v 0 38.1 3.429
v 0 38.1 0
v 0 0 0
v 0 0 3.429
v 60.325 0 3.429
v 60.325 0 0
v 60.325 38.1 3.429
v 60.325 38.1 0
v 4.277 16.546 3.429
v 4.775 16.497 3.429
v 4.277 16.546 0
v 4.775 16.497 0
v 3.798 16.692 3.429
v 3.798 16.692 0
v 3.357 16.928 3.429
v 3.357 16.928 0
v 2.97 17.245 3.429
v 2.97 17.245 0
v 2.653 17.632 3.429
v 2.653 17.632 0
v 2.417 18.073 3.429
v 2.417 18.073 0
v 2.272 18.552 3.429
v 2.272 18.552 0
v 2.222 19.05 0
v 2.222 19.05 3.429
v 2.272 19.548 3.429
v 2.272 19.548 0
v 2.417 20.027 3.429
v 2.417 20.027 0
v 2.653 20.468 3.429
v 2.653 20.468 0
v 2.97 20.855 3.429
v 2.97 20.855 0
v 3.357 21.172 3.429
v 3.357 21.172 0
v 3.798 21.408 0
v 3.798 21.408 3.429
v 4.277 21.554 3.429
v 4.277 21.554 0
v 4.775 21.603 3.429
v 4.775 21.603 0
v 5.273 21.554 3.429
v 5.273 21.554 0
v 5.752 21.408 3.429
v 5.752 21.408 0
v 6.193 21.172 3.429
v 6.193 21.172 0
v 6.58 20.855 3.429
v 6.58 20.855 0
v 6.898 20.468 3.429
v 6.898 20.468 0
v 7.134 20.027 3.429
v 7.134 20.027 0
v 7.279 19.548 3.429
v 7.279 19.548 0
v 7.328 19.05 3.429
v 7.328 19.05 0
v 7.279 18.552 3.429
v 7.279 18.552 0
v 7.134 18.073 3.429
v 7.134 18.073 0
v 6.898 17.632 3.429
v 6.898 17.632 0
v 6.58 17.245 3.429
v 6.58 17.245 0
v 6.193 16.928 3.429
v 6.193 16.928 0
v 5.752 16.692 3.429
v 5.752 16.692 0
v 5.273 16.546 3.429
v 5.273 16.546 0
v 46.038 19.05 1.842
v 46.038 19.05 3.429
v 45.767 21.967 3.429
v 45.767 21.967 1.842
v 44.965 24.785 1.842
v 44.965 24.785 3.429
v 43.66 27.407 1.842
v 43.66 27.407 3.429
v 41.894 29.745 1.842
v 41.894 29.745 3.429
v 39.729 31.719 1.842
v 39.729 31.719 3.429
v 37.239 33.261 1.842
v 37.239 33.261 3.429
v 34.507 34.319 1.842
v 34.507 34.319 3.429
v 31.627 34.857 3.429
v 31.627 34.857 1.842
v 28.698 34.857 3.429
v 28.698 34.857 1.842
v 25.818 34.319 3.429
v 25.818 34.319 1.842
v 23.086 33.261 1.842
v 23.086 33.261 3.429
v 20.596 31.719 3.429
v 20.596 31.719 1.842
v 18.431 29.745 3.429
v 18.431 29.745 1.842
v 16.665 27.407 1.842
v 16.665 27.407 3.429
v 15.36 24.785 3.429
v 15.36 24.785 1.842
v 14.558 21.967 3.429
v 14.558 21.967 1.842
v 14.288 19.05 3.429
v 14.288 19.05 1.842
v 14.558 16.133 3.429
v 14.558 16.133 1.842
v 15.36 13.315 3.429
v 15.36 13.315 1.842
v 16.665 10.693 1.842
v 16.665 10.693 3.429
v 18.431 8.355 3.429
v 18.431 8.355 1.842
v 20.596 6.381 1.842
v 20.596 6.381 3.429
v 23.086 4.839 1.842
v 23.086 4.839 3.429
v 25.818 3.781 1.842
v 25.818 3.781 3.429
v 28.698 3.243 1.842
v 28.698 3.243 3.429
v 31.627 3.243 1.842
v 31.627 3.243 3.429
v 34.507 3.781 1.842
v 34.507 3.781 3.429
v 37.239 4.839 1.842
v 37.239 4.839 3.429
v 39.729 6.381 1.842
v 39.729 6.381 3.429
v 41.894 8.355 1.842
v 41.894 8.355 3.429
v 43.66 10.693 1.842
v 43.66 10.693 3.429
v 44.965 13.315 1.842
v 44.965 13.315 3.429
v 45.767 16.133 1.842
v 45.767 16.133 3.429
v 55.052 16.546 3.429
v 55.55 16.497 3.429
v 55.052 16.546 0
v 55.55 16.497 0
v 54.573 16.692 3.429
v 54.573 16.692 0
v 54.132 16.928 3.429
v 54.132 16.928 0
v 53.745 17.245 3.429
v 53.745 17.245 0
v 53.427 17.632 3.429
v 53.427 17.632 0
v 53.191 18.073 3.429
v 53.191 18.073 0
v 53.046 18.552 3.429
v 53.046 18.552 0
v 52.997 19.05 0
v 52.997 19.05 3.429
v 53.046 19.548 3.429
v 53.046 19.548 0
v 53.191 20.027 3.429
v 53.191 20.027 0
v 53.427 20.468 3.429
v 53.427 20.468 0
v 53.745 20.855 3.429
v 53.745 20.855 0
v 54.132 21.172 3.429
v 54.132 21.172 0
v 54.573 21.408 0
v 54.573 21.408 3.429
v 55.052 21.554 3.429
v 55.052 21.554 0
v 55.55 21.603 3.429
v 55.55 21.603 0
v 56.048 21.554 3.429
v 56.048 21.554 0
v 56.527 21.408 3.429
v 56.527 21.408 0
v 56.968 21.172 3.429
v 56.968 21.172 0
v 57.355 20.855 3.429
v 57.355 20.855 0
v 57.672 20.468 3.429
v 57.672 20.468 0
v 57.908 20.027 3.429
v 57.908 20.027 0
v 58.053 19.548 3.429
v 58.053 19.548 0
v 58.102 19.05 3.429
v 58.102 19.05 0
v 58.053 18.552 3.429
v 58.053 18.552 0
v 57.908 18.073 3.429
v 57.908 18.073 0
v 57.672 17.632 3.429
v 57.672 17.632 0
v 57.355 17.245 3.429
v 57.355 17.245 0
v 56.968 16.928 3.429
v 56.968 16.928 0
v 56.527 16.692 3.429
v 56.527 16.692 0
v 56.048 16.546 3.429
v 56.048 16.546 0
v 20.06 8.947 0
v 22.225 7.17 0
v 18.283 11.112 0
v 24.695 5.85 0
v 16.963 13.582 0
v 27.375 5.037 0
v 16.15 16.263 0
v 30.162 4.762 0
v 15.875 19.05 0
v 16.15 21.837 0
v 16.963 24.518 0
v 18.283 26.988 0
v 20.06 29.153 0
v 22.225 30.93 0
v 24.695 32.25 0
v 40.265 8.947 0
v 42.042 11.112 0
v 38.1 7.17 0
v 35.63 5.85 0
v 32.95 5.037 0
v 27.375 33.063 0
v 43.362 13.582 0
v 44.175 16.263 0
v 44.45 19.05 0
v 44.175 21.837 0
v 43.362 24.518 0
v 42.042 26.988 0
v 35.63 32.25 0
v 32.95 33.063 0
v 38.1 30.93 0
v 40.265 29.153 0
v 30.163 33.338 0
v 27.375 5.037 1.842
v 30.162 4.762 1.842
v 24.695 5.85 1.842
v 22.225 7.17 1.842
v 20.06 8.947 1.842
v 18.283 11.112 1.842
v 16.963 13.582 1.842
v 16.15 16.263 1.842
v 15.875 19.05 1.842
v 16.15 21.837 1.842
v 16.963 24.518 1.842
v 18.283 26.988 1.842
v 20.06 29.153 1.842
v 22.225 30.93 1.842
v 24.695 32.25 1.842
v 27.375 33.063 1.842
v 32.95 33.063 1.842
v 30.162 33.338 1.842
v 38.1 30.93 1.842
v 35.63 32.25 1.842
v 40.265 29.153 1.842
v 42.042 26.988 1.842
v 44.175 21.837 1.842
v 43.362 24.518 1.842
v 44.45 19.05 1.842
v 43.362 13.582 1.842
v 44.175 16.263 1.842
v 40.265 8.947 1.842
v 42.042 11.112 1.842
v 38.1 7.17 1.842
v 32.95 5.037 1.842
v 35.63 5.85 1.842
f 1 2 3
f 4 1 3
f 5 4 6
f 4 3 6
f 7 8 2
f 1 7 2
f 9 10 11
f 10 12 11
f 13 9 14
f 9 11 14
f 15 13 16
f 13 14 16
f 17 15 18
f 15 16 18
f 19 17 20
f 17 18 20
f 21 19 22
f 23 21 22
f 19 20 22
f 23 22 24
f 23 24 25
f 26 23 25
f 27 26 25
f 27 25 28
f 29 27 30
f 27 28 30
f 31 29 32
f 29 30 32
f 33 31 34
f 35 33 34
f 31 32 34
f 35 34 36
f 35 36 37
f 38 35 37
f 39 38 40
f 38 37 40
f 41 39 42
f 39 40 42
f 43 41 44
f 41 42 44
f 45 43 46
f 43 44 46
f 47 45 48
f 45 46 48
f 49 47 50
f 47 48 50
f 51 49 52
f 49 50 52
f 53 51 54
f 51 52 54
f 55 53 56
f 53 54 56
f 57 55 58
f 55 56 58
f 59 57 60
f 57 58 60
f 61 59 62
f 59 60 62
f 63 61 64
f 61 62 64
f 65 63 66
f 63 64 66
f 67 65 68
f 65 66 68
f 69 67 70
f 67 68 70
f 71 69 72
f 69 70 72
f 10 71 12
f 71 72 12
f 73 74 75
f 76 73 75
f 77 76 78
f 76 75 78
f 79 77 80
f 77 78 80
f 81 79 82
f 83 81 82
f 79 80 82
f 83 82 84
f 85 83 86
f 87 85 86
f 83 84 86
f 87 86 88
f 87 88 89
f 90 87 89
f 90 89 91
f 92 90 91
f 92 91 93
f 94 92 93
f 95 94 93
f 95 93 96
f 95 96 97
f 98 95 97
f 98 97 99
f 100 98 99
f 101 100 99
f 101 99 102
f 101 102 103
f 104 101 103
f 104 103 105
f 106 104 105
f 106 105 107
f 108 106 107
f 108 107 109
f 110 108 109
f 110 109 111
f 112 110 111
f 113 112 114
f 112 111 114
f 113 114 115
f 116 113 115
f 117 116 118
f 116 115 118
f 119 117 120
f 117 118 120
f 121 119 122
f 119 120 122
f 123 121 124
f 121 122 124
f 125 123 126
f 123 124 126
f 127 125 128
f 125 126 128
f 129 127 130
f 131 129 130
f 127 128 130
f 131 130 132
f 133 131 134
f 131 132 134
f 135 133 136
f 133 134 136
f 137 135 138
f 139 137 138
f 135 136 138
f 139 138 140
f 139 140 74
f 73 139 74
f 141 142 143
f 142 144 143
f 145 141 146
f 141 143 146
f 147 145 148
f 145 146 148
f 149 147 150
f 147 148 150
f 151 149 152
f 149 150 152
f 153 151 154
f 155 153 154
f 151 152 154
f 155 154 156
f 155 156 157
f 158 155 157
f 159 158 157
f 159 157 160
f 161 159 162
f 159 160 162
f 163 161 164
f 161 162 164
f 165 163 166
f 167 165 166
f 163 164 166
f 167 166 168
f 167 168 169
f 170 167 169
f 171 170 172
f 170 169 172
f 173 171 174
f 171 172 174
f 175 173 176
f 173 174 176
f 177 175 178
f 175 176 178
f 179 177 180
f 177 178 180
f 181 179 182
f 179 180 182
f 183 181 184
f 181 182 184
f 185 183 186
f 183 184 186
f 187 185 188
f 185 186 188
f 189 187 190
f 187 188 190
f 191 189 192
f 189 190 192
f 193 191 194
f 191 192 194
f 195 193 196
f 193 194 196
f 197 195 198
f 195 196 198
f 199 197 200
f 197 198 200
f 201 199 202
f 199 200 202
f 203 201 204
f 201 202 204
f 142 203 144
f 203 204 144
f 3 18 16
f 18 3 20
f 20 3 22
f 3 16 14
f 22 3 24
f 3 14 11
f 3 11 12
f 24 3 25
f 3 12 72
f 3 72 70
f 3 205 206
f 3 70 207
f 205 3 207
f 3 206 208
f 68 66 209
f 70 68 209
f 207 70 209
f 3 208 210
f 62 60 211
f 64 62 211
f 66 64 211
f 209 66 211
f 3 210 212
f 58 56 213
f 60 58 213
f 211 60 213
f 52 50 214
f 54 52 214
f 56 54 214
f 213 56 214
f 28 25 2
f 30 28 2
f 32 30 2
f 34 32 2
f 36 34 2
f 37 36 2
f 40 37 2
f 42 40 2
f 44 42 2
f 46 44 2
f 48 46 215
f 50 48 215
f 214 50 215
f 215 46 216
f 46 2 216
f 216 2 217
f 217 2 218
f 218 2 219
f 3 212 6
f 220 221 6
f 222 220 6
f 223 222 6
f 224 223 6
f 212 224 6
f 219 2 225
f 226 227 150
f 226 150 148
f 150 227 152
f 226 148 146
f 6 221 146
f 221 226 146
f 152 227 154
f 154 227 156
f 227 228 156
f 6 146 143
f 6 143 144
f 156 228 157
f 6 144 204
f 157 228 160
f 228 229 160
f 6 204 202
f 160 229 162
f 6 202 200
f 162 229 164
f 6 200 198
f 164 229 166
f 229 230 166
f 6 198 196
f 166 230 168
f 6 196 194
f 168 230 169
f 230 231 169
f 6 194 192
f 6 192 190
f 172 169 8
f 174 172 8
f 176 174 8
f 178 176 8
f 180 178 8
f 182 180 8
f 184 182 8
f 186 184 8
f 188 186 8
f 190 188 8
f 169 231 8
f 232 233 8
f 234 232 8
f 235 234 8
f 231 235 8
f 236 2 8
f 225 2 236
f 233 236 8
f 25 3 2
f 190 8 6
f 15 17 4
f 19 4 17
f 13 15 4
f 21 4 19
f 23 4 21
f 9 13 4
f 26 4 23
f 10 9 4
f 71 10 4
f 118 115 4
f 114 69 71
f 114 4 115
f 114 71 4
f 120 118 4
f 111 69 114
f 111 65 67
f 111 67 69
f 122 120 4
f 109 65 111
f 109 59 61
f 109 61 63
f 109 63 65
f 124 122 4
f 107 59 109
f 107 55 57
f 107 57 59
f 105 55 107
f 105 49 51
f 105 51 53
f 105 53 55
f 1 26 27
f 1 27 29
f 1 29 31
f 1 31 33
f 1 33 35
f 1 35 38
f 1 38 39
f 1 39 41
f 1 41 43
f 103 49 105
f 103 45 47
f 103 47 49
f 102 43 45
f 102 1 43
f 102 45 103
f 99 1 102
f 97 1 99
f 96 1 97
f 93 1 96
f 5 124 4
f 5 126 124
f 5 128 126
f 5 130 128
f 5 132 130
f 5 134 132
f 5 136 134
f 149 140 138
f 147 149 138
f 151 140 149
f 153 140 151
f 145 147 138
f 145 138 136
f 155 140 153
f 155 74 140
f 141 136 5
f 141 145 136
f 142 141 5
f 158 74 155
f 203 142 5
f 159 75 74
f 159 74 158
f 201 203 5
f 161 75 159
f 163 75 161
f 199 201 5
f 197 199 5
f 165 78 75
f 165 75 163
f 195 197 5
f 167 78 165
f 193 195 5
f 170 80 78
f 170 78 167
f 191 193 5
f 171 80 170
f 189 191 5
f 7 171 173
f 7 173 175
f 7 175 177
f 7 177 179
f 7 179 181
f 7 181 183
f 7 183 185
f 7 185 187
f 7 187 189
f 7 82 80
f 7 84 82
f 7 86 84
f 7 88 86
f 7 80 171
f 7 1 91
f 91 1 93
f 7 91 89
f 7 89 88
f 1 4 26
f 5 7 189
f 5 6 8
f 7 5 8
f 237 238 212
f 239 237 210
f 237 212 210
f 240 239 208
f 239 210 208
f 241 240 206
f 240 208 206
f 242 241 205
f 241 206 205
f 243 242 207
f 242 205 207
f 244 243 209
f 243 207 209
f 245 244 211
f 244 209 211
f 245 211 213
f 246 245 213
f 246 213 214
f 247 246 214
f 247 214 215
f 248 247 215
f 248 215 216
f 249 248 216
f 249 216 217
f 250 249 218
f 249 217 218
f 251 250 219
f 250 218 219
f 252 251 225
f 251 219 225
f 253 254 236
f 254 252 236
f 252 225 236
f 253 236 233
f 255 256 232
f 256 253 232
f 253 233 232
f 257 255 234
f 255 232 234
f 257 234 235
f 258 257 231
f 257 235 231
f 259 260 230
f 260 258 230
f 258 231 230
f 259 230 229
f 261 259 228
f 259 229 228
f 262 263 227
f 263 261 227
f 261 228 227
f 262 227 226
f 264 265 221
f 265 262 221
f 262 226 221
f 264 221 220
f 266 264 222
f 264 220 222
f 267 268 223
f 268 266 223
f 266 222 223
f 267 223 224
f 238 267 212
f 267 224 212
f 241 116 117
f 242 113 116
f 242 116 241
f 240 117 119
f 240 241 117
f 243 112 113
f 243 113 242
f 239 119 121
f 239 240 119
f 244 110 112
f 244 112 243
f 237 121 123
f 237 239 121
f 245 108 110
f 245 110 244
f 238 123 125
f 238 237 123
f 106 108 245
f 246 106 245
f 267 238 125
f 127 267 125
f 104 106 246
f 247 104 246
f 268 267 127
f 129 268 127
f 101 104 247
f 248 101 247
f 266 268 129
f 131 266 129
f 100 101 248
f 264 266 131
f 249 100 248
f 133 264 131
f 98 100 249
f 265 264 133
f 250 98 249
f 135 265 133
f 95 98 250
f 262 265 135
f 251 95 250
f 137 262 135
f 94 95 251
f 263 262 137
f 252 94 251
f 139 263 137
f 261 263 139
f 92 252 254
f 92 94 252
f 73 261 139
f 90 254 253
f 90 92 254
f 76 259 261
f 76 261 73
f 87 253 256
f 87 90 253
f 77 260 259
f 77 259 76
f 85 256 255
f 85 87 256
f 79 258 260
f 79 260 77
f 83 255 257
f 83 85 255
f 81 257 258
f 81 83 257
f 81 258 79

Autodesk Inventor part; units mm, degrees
ref_plane "YZ Plane" through (0, 0, 0) normal (1, 0, 0) x (0, 1, 0)
ref_plane "XZ Plane" through (0, 0, 0) normal (0, 1, 0) x (-1, 0, 0)
ref_plane "XY Plane" through (0, 0, 0) normal (0, 0, 1) x (1, 0, 0)
sketch "Sketch1" plane through (0, 0, 0) normal (0, 0, 1) x (1, 0, 0)
  line L0 (0, 0) -> (60.325, 0)
  line L1 (60.325, 0) -> (60.325, 38.1)
  line L2 (60.325, 38.1) -> (0, 38.1)
  line L3 (0, 38.1) -> (0, 0)
  dimension "d0" = 60.325
  dimension "d1" = 38.1
extrude "Extrusion1" add sketch "Sketch1" along normal blind 3.429
sketch "Sketch4" plane through (0, 0, 3.429) normal (0, 0, 1) x (1, 0, 0)
  line L0 (60.325, 38.1) -> (0, 38.1) projected
  line L1 (0, 38.1) -> (0, 0) projected
  point P0 (30.1625, 19.05)
  point P1 (30.1625, 38.1)
  point P2 (0, 19.05)
hole "Hole1" at (30.1625, 19.05, 3.429) direction (0, 0, -1) diameter 28.575 end through all
sketch "Sketch5" plane through (0, 0, 3.429) normal (0, 0, 1) x (1, 0, 0)
  line L0 (0, 38.1) -> (0, 0) projected
  point P0 (60.325, 0)
  point P1 (60.325, 38.1)
  point P2 (4.7752, 19.05)
  point P3 (55.5498, 19.05)
  point P4 (0, 19.05)
  point P5 (0, 19.05)
  dimension "d19" = 4.7752
  dimension "d20" = 4.7752
  dimension "d21" = 19.05
  dimension "d22" = 19.05
hole "Hole2" at (4.7752, 19.05, 3.429) at (55.5498, 19.05, 3.429) direction (0, 0, -1) diameter 5.1054 end through all
sketch "Sketch6" plane through (0, 0, 3.429) normal (0, 0, 1) x (1, 0, 0)
  circle A0 centre (30.1625, 19.05) radius 14.2875 projected
  circle A1 centre (30.1625, 19.05) radius 15.875
  dimension "d30" = 31.75
extrude "Extrusion2" cut sketch "Sketch6" against normal blind 1.5875
properties part number "Bearing Reciver for 1-2 bearing"
